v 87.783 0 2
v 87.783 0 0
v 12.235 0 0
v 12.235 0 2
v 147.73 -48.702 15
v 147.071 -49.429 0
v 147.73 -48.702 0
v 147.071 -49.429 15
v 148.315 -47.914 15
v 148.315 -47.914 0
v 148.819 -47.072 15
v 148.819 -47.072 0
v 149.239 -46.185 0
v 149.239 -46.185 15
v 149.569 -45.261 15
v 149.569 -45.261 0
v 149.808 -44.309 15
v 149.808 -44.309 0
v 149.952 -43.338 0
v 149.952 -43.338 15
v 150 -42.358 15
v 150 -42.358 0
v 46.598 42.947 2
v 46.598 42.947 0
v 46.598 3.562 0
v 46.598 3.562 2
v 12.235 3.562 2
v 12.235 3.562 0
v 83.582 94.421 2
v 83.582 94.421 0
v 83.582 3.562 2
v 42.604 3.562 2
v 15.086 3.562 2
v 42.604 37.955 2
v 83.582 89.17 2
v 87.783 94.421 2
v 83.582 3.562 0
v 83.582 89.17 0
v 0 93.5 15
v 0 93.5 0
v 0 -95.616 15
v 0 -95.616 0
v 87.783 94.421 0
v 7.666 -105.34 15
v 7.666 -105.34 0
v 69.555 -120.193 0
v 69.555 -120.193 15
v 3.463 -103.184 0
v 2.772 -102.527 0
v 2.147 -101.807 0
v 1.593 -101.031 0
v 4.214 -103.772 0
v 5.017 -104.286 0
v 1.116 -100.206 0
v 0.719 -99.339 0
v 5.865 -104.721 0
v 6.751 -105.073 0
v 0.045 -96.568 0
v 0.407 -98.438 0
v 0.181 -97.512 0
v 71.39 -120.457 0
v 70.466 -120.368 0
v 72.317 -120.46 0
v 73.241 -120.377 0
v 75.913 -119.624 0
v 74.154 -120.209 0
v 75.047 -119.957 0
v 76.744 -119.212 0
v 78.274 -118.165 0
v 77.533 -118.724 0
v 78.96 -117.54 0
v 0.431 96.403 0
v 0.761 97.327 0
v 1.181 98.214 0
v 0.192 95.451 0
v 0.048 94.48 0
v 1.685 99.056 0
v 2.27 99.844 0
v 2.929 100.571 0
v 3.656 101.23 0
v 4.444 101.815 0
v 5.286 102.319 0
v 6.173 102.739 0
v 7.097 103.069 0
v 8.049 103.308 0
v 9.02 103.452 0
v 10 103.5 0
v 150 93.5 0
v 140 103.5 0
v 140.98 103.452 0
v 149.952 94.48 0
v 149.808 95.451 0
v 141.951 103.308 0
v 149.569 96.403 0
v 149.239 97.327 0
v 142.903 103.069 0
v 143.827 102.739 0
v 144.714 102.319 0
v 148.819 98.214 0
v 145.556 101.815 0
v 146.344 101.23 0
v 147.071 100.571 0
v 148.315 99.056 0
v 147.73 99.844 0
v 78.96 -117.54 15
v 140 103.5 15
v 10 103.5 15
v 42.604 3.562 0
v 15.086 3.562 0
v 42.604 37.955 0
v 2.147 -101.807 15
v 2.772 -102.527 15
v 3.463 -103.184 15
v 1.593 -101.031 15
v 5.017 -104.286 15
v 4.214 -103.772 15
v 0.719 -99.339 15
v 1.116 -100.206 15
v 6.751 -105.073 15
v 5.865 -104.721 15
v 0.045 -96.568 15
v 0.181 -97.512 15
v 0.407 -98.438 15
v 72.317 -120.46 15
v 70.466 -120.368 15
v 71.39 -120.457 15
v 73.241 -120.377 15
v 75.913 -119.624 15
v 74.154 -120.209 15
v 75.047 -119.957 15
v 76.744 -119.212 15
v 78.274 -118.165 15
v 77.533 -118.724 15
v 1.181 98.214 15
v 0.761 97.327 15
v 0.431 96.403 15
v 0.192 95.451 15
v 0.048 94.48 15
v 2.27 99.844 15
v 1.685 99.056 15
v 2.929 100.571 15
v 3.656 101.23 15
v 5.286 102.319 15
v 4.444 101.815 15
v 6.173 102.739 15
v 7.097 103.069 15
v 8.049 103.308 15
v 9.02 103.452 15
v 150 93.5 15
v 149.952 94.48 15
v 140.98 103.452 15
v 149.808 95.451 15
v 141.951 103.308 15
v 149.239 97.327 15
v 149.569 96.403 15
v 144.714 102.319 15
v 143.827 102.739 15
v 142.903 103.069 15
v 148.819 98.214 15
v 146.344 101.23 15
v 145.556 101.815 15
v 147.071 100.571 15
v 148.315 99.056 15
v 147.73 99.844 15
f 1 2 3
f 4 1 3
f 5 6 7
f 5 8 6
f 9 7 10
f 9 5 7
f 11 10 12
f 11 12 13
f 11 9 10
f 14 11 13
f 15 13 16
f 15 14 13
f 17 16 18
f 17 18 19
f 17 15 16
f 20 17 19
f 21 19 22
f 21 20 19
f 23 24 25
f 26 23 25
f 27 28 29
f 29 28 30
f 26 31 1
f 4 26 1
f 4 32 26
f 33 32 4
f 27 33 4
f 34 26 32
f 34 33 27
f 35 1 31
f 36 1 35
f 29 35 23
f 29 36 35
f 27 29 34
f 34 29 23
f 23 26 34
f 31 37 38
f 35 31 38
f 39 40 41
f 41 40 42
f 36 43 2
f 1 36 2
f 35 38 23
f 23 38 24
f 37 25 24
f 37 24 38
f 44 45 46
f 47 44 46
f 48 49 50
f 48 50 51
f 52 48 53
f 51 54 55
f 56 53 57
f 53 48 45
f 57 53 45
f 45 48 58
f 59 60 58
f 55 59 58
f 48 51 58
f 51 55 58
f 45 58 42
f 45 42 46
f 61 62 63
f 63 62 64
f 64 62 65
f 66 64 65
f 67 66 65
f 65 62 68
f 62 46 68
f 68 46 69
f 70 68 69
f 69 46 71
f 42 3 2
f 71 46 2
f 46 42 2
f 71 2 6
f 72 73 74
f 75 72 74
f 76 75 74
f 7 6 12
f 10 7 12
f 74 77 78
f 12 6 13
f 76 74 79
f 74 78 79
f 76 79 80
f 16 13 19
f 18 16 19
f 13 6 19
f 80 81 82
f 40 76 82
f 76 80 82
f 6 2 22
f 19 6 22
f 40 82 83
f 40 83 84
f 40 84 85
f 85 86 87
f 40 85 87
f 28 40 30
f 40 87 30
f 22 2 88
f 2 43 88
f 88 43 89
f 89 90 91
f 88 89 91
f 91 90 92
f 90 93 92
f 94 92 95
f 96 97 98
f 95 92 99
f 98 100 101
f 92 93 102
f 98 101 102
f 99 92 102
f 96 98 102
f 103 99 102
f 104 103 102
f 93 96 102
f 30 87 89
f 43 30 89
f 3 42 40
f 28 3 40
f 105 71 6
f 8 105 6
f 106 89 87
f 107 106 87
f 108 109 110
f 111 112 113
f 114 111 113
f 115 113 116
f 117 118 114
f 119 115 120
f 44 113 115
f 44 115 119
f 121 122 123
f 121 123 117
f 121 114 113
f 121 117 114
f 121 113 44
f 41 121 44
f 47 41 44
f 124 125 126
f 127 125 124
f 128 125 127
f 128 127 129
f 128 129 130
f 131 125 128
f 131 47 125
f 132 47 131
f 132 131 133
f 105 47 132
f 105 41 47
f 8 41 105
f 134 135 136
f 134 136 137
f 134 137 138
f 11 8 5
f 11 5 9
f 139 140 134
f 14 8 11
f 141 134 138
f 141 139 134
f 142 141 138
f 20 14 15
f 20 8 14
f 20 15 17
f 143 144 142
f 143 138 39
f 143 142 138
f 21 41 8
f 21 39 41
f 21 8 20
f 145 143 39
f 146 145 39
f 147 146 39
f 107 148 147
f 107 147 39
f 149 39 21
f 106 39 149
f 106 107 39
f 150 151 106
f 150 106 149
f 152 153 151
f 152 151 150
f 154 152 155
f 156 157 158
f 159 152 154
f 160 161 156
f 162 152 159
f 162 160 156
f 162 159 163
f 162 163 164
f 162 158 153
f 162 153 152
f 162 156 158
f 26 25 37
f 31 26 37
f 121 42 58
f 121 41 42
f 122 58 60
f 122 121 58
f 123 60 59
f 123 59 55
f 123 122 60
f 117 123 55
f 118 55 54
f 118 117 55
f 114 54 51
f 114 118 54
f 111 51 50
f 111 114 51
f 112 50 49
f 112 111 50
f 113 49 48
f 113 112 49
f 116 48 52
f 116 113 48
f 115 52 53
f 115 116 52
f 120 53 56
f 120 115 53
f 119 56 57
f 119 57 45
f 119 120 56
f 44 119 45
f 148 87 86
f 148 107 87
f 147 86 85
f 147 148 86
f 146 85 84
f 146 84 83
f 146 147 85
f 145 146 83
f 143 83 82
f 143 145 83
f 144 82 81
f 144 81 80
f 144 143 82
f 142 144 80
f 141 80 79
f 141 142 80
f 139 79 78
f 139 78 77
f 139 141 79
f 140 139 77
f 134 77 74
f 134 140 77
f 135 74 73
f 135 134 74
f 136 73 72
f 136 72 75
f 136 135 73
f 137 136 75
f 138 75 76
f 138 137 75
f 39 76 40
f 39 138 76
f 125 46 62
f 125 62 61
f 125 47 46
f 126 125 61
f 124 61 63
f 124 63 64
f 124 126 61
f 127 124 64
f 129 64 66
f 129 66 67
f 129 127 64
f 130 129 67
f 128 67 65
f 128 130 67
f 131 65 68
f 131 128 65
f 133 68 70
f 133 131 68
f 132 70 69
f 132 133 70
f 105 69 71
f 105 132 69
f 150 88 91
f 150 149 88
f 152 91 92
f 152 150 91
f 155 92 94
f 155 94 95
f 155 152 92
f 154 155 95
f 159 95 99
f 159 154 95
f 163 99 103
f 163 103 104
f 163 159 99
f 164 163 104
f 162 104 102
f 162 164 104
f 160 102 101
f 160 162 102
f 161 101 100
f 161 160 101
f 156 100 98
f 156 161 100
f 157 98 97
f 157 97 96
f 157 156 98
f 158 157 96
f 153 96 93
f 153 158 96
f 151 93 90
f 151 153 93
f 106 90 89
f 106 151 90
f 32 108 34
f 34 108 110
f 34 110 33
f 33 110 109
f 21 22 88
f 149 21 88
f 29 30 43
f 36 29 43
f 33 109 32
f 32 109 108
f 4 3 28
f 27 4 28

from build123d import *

# Parameters (mm, degrees)
BOSS_EXTRUDE1_DEPTH = 15
FILLET1_R           = 10
FILLET2_R           = 10
FILLET4_R           = 10
FILLET5_R           = 10
FILLET6_R           = 10
CUT_EXTRUDE1_DEPTH  = 2


with BuildPart() as part:
    # Sketch1 → Boss-Extrude1 (new body)
    with BuildSketch(Plane.XY):
        Polygon((0, 103.5), (0, -103.5), (75, -121.5), (150, -46.5), (150, 103.5), align=None)
    extrude(amount=BOSS_EXTRUDE1_DEPTH)

    # Fillet1
    fillet1_edges = [part.edges().sort_by_distance(p)[0] for p in [
        (0, -103.5, 7.5),
    ]]
    fillet(fillet1_edges, radius=FILLET1_R)

    # Fillet2
    fillet2_edges = [part.edges().sort_by_distance(p)[0] for p in [
        (75, -121.5, 7.5),
    ]]
    fillet(fillet2_edges, radius=FILLET2_R)

    # Fillet4
    fillet4_edges = [part.edges().sort_by_distance(p)[0] for p in [
        (150, -46.5, 7.5),
    ]]
    fillet(fillet4_edges, radius=FILLET4_R)

    # Fillet5
    fillet5_edges = [part.edges().sort_by_distance(p)[0] for p in [
        (150, 103.5, 7.5),
    ]]
    fillet(fillet5_edges, radius=FILLET5_R)

    # Fillet6
    fillet6_edges = [part.edges().sort_by_distance(p)[0] for p in [
        (0, 103.5, 7.5),
    ]]
    fillet(fillet6_edges, radius=FILLET6_R)

    # Sketch2 → Cut-Extrude1 (cut)
    with BuildSketch(Plane(origin=(0, 0, 0), x_dir=(-1, 0, 0), z_dir=(0, 0, -1))):
        Polygon((-12.235489358, 0), (-12.235489358, 3.562429258), (-83.581556078, 94.421338251), (-87.783155362, 94.421338251), (-87.783155362, 3.562429258), (-87.783155362, 0), (-83.581556078, 0), (-46.597715557, 0), (-42.603563367, 0), align=None)
        Polygon((-46.597715557, 3.562429258), (-83.581556078, 3.562429258), (-83.581556078, 89.170075728), (-46.597715557, 42.94675871), align=None, mode=Mode.SUBTRACT)
        Polygon((-42.603563367, 37.954768687), (-15.085832519, 3.562429258), (-42.603563367, 3.562429258), align=None, mode=Mode.SUBTRACT)
    extrude(amount=-CUT_EXTRUDE1_DEPTH, mode=Mode.SUBTRACT)


solid = part.part
